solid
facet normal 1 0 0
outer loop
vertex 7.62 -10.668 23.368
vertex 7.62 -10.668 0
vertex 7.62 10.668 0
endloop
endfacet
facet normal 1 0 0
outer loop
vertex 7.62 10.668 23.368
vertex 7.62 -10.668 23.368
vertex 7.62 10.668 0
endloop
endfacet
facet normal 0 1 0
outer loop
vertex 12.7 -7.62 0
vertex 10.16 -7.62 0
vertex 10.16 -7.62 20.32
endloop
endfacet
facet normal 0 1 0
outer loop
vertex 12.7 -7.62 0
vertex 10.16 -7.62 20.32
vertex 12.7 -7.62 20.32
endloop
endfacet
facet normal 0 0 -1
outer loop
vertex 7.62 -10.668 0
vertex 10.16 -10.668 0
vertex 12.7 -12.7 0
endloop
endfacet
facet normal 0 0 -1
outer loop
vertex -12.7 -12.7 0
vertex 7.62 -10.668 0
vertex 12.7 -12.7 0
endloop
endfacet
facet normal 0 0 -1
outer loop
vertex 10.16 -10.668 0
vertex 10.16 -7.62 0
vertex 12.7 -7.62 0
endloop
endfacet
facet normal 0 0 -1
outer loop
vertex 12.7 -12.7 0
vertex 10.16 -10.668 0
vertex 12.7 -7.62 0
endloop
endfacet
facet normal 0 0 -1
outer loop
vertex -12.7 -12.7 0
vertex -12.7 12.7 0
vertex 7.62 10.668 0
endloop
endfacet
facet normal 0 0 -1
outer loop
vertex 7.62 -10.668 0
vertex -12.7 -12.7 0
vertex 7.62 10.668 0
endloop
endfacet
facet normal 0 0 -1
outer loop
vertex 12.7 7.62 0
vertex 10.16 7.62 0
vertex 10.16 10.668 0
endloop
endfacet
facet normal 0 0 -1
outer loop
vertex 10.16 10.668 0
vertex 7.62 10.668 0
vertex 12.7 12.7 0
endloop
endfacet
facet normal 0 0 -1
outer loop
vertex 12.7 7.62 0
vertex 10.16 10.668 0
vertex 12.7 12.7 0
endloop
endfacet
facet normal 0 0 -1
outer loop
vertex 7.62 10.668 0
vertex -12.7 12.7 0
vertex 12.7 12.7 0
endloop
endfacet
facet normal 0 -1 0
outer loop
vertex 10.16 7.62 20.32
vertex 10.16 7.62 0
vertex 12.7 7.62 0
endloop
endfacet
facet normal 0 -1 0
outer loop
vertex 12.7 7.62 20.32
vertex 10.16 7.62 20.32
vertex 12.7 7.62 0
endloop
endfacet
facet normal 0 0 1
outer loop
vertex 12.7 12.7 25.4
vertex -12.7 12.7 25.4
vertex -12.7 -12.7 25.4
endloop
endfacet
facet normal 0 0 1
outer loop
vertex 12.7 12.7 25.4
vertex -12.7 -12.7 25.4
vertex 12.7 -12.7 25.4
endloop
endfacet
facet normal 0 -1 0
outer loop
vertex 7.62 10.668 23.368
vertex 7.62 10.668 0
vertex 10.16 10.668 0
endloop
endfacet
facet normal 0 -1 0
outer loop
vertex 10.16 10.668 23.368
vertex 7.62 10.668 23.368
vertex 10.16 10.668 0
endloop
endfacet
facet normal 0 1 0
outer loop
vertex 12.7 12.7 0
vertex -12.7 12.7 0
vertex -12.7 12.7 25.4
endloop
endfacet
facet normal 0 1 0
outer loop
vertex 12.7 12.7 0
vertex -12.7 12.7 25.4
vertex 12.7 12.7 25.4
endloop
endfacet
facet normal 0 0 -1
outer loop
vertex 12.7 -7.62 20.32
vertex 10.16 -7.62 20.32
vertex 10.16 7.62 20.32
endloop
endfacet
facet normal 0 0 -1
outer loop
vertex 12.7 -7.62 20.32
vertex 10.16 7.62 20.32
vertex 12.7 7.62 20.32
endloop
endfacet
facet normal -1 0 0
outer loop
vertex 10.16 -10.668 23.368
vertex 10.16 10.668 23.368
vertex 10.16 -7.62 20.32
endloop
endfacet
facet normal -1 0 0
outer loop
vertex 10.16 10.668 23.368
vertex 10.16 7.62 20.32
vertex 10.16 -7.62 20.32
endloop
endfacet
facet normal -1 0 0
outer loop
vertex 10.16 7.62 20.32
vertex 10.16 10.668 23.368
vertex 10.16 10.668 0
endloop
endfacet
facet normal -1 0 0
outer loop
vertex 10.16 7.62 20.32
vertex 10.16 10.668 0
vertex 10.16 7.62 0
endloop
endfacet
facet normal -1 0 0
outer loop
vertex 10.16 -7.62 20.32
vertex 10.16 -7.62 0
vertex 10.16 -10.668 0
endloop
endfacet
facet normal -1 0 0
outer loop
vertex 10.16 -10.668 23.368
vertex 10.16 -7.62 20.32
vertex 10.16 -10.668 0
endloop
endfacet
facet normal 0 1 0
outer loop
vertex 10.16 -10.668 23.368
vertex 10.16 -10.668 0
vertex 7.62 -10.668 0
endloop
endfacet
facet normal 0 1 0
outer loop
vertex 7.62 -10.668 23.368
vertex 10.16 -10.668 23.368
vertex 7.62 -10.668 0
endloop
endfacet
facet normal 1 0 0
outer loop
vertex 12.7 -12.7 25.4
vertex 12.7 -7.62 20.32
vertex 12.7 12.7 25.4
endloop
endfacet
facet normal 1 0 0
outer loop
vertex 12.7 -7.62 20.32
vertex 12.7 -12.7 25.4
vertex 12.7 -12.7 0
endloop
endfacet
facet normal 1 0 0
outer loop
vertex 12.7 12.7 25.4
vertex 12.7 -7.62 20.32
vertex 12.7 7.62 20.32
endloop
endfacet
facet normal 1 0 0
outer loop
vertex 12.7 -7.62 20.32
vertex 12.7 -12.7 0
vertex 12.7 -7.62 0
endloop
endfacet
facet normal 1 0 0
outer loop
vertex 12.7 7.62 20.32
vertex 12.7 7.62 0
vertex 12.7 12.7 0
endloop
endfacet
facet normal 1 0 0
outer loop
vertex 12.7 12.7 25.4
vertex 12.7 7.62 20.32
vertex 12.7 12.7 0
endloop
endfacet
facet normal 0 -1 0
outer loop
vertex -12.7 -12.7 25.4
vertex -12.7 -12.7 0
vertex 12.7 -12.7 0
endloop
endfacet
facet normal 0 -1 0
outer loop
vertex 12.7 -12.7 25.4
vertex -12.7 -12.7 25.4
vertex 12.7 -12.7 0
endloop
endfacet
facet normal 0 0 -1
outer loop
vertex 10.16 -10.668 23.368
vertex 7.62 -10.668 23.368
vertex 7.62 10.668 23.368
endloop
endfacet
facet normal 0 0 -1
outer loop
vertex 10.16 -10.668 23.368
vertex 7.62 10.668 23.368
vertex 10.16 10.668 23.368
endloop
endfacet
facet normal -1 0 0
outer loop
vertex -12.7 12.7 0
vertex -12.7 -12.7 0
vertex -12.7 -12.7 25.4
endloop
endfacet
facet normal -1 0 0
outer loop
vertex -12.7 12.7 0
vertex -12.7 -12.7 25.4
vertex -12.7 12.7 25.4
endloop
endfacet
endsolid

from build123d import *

# Parameters (mm, degrees)
F0_W     = 25.4
F0_H     = 25.4
F1_DEPTH = 25.4
F3_DEPTH = 23.368
F2_W     = 2.54
F2_H     = 15.24
F4_DEPTH = 20.32


with BuildPart() as f1:
    # F0 (on Top) → F1 (new body)
    with BuildSketch(Plane.XY):
        Rectangle(F0_W, F0_H)
    extrude(amount=F1_DEPTH)

    # F2 (on face) → F3 (cut)
    with BuildSketch(Plane(origin=(0, 0, 0), x_dir=(1, 0, 0), z_dir=(0, 0, -1))):
        Polygon((10.16, -7.62), (10.16, 7.62), (10.16, 10.668), (7.62, 10.668), (7.62, -10.668), (10.16, -10.668), align=None)
    extrude(amount=-F3_DEPTH, mode=Mode.SUBTRACT)

    # F2 (on face) → F4 (cut)
    with BuildSketch(Plane(origin=(0, 0, 0), x_dir=(1, 0, 0), z_dir=(0, 0, -1))):
        with Locations((11.43, 0)):
            Rectangle(F2_W, F2_H)
    extrude(amount=-F4_DEPTH, mode=Mode.SUBTRACT)


solid = f1.part
